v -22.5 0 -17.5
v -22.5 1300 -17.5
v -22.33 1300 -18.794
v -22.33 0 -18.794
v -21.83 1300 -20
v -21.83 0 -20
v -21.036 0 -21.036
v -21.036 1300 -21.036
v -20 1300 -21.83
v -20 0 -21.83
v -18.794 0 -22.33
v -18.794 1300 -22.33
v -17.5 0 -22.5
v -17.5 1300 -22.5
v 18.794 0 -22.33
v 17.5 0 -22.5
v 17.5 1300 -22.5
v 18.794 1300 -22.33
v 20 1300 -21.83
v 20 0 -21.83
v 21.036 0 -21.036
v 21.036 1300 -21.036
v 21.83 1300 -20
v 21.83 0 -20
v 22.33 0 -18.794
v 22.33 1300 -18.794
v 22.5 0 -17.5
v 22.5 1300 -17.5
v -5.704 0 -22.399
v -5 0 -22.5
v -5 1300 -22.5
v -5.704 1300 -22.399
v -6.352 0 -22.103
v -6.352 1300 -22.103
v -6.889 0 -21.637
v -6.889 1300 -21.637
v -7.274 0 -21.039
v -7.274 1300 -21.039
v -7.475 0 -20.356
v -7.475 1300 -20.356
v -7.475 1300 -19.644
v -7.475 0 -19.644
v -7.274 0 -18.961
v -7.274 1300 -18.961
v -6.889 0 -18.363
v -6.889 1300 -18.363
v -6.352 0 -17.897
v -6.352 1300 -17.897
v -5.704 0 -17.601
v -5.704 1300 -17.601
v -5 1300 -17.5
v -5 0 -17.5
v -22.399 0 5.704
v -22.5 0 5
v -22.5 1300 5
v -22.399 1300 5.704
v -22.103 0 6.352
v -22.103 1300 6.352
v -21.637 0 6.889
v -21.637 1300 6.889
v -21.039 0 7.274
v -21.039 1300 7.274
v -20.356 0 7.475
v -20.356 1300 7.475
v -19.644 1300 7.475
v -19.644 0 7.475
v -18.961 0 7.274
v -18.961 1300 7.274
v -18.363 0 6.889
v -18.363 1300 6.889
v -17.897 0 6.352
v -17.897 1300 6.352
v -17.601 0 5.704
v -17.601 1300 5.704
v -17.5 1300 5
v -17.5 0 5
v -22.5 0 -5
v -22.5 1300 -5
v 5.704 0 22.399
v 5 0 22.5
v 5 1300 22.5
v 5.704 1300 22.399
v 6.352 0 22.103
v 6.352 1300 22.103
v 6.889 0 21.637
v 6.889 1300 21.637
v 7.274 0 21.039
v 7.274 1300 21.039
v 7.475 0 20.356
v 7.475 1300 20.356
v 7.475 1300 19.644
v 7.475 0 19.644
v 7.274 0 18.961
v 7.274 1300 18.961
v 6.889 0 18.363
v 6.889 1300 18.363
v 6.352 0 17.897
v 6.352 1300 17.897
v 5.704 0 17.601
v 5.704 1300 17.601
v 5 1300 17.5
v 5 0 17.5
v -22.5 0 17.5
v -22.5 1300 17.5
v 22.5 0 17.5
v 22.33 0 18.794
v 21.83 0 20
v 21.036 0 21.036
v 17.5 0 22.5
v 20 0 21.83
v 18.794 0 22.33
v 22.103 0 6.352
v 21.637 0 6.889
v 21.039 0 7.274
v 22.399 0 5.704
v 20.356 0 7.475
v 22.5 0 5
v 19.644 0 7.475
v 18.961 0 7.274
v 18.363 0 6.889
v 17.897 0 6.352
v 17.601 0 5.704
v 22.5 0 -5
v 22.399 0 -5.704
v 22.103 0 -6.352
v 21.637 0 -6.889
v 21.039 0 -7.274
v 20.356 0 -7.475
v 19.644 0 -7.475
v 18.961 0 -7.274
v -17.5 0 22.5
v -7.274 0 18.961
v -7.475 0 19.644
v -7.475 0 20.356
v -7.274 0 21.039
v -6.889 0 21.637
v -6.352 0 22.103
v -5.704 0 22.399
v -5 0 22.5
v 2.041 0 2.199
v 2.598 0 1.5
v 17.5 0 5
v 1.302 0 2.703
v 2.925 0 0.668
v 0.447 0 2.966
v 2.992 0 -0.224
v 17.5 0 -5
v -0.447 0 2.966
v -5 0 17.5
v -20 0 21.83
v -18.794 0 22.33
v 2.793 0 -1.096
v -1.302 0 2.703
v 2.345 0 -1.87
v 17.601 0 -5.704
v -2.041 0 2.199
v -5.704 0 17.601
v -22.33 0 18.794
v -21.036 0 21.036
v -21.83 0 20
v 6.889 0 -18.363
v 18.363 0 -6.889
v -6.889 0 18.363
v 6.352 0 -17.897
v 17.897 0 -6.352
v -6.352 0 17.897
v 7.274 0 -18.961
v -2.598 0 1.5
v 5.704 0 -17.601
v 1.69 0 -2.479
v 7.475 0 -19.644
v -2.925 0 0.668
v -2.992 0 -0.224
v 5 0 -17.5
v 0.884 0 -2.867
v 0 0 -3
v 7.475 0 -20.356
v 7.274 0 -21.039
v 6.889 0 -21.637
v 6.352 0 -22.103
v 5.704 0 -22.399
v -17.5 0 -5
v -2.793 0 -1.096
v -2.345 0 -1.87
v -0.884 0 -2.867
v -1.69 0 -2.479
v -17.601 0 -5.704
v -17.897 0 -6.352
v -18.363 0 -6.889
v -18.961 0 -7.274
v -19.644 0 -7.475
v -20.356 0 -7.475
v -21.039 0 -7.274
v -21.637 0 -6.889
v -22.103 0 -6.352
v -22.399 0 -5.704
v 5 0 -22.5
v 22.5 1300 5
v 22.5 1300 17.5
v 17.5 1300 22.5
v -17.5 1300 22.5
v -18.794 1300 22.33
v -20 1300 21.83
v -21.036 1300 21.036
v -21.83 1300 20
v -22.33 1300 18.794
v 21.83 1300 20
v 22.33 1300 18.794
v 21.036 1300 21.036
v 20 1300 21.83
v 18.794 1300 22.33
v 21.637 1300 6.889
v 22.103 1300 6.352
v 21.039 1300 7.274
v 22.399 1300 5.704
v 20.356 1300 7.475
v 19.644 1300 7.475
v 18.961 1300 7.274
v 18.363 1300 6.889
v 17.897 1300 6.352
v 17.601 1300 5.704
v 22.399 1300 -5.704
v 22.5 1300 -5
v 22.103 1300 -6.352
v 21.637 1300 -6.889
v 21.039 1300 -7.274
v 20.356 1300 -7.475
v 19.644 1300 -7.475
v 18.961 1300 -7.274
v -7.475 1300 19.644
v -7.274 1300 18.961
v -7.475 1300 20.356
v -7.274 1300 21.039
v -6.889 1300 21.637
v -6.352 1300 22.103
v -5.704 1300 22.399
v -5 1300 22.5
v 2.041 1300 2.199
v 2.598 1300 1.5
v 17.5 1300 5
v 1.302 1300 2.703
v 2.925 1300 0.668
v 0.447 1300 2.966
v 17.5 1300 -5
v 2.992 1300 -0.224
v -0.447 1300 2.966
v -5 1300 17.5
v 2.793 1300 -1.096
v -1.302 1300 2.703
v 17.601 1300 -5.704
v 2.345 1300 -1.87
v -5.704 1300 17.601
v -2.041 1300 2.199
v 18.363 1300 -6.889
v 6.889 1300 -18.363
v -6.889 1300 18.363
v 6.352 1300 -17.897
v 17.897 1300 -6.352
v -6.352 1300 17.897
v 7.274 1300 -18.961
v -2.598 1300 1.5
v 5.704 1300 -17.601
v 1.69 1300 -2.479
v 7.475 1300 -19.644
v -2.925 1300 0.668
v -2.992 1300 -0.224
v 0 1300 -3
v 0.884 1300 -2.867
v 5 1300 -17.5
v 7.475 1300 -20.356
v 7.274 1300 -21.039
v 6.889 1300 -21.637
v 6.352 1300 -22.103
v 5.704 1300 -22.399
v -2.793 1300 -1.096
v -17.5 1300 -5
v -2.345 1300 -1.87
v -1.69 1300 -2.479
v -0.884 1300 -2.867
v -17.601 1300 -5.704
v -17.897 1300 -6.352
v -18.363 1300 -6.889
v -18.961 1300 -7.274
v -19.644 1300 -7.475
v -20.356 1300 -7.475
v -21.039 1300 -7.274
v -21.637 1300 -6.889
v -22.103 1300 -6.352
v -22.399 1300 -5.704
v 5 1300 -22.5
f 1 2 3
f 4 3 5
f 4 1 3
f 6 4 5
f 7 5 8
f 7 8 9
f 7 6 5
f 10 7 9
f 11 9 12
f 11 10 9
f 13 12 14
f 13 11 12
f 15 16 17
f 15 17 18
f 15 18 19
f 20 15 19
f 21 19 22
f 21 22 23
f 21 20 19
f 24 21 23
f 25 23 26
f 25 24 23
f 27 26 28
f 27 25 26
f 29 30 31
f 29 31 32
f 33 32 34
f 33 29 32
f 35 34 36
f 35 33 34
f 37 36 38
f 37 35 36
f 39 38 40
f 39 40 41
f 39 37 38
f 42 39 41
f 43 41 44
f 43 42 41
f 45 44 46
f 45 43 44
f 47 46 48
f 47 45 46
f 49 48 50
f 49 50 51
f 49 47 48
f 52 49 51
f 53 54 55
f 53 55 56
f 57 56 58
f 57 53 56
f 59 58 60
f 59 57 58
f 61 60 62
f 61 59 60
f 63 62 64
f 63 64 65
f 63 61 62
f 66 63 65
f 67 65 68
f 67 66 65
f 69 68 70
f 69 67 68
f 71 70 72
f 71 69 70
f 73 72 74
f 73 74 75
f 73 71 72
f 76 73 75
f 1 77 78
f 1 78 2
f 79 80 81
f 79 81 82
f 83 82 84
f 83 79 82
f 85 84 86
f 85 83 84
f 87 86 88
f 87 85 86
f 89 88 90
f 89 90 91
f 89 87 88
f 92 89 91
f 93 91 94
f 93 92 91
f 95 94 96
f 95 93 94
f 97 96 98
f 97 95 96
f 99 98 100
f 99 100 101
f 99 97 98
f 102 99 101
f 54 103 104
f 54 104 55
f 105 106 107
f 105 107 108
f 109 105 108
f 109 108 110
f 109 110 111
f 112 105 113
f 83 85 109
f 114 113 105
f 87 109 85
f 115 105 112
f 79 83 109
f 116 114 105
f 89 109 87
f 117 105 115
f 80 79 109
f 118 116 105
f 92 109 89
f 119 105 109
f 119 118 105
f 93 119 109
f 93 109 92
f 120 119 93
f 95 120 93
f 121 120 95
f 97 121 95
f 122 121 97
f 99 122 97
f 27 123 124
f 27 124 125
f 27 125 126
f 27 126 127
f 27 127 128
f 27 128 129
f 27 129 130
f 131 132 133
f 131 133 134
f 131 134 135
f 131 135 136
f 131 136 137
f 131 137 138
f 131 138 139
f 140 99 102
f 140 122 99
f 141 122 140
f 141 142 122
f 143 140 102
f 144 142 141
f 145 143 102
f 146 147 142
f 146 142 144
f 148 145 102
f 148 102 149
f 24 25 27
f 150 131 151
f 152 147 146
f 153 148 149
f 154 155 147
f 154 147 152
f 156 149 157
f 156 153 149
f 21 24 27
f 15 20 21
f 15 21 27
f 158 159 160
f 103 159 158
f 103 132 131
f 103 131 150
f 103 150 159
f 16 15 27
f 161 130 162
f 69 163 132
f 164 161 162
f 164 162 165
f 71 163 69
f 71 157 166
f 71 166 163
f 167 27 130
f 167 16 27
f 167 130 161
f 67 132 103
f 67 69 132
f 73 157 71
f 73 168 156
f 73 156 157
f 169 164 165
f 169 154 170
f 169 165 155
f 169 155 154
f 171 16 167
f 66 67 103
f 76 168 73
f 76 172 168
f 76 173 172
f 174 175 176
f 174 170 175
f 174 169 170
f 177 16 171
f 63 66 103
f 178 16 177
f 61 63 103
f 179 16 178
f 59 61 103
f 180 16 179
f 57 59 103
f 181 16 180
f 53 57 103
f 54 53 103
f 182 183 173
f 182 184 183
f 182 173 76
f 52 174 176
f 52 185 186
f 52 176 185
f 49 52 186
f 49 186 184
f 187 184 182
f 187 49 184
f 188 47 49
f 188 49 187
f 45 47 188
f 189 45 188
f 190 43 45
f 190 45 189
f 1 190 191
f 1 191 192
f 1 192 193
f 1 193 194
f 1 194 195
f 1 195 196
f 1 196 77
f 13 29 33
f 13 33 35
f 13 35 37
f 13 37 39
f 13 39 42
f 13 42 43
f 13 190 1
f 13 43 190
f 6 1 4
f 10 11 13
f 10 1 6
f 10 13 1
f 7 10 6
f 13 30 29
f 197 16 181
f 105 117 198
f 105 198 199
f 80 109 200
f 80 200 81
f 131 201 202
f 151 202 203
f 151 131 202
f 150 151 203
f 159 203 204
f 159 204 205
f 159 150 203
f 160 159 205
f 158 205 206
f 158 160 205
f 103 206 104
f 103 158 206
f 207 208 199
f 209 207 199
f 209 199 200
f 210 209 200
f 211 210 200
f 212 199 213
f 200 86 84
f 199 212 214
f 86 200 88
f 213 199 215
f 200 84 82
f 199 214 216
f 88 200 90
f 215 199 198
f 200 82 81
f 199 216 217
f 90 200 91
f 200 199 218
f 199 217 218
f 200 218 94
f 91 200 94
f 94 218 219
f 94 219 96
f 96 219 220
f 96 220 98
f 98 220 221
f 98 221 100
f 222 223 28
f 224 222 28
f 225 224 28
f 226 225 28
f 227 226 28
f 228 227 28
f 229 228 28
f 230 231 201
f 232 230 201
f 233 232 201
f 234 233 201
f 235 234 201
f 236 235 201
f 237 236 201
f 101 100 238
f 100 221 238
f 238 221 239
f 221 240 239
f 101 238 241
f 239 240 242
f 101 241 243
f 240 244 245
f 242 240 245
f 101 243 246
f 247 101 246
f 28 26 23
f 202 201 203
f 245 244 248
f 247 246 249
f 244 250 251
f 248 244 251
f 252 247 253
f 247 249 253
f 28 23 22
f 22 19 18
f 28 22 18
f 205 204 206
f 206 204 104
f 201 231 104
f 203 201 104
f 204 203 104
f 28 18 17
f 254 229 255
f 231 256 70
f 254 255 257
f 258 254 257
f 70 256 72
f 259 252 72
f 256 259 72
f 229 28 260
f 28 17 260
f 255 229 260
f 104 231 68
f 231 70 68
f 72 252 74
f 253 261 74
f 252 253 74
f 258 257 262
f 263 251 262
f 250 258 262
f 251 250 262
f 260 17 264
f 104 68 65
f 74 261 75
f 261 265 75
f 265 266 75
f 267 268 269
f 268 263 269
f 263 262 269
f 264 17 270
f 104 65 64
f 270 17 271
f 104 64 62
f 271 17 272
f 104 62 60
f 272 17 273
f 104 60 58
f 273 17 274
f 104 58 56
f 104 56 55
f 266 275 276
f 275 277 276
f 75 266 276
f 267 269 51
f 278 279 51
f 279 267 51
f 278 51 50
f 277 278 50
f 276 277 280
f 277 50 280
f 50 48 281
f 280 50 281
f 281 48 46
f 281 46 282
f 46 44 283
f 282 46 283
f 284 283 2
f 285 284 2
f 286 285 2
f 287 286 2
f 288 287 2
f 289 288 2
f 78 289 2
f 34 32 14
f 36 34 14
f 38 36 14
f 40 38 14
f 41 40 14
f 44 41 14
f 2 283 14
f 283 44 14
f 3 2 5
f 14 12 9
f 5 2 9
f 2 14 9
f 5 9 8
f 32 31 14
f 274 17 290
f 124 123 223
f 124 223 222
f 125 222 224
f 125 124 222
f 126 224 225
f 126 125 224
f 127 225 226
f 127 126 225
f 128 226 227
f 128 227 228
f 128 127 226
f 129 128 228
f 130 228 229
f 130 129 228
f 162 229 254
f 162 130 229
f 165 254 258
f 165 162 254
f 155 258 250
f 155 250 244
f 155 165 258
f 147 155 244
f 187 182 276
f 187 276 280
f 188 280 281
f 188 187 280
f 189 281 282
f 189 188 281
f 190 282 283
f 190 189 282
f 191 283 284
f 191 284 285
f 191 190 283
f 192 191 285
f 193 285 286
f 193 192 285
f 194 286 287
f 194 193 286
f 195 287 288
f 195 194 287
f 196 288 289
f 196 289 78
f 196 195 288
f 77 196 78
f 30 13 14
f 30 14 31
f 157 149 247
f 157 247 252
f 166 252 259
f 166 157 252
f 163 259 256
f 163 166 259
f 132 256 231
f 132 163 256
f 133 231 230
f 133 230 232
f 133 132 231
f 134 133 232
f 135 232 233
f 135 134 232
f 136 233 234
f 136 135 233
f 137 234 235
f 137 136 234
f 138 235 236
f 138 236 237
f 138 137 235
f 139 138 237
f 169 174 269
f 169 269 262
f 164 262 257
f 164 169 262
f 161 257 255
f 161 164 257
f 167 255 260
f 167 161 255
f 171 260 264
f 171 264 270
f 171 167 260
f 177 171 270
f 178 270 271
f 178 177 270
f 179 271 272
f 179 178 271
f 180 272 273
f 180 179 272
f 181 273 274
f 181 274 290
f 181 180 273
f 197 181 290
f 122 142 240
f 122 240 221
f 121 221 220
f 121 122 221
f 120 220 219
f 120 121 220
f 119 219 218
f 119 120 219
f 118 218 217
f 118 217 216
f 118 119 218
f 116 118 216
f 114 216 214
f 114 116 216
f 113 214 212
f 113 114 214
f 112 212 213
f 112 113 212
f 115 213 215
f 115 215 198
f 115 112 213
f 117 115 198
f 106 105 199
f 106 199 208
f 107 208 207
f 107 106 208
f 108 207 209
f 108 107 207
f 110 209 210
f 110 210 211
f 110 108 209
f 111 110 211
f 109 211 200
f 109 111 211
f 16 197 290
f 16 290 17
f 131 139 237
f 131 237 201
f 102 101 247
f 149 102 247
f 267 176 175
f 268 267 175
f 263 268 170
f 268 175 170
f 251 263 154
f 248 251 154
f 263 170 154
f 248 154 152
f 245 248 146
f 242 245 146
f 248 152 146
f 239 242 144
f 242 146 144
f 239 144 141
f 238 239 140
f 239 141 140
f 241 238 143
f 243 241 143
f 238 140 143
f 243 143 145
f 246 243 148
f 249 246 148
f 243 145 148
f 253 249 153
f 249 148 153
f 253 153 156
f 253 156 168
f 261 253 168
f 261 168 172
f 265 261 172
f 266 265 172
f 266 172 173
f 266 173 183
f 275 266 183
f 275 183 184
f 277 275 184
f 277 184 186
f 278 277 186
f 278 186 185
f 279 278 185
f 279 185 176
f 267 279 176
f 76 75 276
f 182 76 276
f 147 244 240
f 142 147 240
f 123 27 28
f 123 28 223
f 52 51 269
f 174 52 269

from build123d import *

# Parameters (mm, degrees)
BOSS_EXTRU_2_DEPTH      = 1300
ESQUISSE5_R             = 3
ENL_V_MAT_EXTRU_1_DEPTH = 1301.389364767


with BuildPart() as part:
    # Esquisse4 → Boss.-Extru.2 (new body)
    with BuildSketch(Plane(origin=(0, 0, 0), x_dir=(1, 0, 0), z_dir=(0, 1, 0))):
        with BuildLine():
            Line((-17.5, 22.5), (-5, 22.5))
            ThreePointArc((-5, 22.5), (-7.5, 20), (-5, 17.5))
            Line((-5, 17.5), (5, 17.5))
            ThreePointArc((5, 17.5), (7.5, 20), (5, 22.5))
            Line((5, 22.5), (17.5, 22.5))
            ThreePointArc((17.5, 22.5), (21.035534799, 21.035533013), (22.5, 17.499997475))
            Line((22.5, 17.499997475), (22.5, 4.999997475))
            ThreePointArc((22.5, 4.999997475), (20, 7.499997475), (17.5, 4.999997475))
            Line((17.5, 4.999997475), (17.5, -5.000002525))
            ThreePointArc((17.5, -5.000002525), (20, -7.500002525), (22.5, -5.000002525))
            Line((22.5, -5.000002525), (22.5, -17.500002525))
            ThreePointArc((22.5, -17.500002525), (21.035533013, -21.035534799), (17.5, -22.5))
            Line((17.5, -22.5), (5, -22.5))
            ThreePointArc((5, -22.5), (7.5, -20), (5, -17.5))
            Line((5, -17.5), (-5, -17.5))
            ThreePointArc((-5, -17.5), (-7.5, -20), (-5, -22.5))
            Line((-5, -22.5), (-17.5, -22.5))
            ThreePointArc((-17.5, -22.5), (-21.035533906, -21.035533906), (-22.5, -17.5))
            Line((-22.5, -17.5), (-22.5, -5))
            ThreePointArc((-22.5, -5), (-20, -7.5), (-17.5, -5))
            Line((-17.5, -5), (-17.5, 5))
            ThreePointArc((-17.5, 5), (-20, 7.5), (-22.5, 5))
            Line((-22.5, 5), (-22.5, 17.5))
            ThreePointArc((-22.5, 17.5), (-21.035533906, 21.035533906), (-17.5, 22.5))
        make_face()
    extrude(amount=BOSS_EXTRU_2_DEPTH)

    # Esquisse5 → Enlèv. mat.-Extru.1 (cut, through all)
    with BuildSketch(Plane.XZ):
        with Locations(Location((0, 0, 0), (0, 0, 270))):
            Circle(ESQUISSE5_R)
    extrude(amount=-ENL_V_MAT_EXTRU_1_DEPTH, mode=Mode.SUBTRACT)


solid = part.part
